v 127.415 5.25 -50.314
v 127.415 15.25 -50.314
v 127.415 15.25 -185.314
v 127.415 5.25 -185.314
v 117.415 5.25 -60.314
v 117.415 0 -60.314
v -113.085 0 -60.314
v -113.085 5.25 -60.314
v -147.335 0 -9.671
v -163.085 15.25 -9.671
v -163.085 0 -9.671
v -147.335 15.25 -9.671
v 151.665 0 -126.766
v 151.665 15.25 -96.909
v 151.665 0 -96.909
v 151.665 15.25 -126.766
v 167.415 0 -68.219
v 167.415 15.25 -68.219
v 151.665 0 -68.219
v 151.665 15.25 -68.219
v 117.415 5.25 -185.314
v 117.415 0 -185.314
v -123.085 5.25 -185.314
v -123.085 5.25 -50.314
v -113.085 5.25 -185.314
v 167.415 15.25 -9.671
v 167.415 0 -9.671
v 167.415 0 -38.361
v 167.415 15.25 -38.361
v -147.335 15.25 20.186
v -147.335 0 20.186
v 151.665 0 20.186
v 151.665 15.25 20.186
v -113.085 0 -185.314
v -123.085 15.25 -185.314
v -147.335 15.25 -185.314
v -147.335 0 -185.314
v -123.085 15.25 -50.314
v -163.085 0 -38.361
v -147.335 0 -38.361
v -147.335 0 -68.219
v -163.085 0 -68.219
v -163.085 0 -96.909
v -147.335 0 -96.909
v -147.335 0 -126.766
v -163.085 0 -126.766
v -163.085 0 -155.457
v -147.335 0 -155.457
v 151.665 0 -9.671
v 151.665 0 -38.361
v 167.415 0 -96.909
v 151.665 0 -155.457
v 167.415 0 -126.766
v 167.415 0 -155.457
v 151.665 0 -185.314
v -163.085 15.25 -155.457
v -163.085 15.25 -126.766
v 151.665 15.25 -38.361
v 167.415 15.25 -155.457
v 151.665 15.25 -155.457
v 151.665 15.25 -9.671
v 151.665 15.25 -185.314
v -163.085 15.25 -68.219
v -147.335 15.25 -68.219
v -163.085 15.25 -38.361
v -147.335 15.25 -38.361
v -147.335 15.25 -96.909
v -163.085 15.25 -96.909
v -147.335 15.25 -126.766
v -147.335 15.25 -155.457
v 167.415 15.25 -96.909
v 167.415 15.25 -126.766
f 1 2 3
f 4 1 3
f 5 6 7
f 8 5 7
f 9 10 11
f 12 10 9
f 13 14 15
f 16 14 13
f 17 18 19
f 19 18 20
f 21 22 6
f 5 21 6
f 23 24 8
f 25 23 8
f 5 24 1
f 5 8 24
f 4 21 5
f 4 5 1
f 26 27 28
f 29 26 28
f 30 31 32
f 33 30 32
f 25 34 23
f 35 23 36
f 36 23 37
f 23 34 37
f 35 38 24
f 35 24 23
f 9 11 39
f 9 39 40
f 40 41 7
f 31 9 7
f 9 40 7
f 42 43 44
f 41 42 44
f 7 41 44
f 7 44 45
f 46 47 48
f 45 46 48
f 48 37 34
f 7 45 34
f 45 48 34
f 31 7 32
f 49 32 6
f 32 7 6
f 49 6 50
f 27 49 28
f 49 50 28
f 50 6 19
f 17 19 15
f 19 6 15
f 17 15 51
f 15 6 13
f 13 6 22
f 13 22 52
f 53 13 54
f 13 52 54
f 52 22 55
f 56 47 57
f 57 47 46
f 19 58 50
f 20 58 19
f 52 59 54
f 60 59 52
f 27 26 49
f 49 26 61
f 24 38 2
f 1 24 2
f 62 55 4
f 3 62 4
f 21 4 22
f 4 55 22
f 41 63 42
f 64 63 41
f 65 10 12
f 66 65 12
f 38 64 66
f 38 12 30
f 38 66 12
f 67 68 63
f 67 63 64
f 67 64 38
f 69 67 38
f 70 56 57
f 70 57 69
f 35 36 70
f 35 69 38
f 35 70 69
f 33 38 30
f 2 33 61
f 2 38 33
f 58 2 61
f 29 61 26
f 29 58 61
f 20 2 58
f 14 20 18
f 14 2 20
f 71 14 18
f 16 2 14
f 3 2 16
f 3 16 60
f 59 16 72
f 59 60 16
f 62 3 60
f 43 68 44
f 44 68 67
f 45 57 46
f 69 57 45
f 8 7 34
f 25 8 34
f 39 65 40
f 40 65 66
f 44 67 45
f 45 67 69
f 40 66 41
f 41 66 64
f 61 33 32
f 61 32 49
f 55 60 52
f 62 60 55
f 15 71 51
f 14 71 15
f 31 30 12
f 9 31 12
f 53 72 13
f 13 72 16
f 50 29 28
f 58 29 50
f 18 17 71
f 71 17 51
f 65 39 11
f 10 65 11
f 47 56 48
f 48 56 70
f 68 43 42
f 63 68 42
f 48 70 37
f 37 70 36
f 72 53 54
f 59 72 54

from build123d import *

# Parameters (mm, degrees)
BOSS_EXTRU_1_DEPTH      = 15.25
ESQUISSE2_W             = 250.5
ESQUISSE2_H             = 135
ENL_V_MAT_EXTRU_1_DEPTH = 10
ESQUISSE3_W             = 15.75
ESQUISSE3_H             = 29.857142857
ESQUISSE3_H_2           = 29.857142858
ENL_V_MAT_EXTRU_2_DEPTH = 15.25


with BuildPart() as part:
    # Esquisse1 → Boss.-Extru.1 (new body)
    with BuildSketch(Plane(origin=(0, 0, 0), x_dir=(1, 0, 0), z_dir=(0, 1, 0))):
        Polygon((-113.085152838, 185.313864629), (-163.085152838, 185.313864629), (-163.085152838, -20.186135371), (167.414847162, -20.186135371), (167.414847162, 185.313864629), (117.414847162, 185.313864629), (117.414847162, 60.313864629), (-113.085152838, 60.313864629), align=None)
    extrude(amount=BOSS_EXTRU_1_DEPTH)

    # Esquisse2 → Enlèv. mat.-Extru.1 (cut)
    with BuildSketch(Plane(origin=(0, 15.25, 0), x_dir=(1, 0, 0), z_dir=(0, 1, 0))):
        with Locations((2.164847162, 117.813864629)):
            Rectangle(ESQUISSE2_W, ESQUISSE2_H)
    extrude(amount=-ENL_V_MAT_EXTRU_1_DEPTH, mode=Mode.SUBTRACT)

    # Esquisse3 → Enlèv. mat.-Extru.2 (cut)
    with BuildSketch(Plane(origin=(0, 15.25, 0), x_dir=(1, 0, 0), z_dir=(0, 1, 0))):
        with Locations((-155.210152838, 170.385293201)):
            Rectangle(ESQUISSE3_W, ESQUISSE3_H)
        with Locations((-155.210152838, 111.837674152)):
            Rectangle(ESQUISSE3_W, ESQUISSE3_H)
        with Locations((-155.210152838, 53.290055105)):
            Rectangle(ESQUISSE3_W, ESQUISSE3_H_2)
        with Locations((-155.210152838, -5.257563943)):
            Rectangle(ESQUISSE3_W, ESQUISSE3_H)
    enl_v_mat_extru_2 = extrude(amount=-ENL_V_MAT_EXTRU_2_DEPTH, mode=Mode.SUBTRACT)

    # Symétrie1: Enlèv. mat.-Extru.2 across plane
    add(enl_v_mat_extru_2.mirror(Plane.ZY.offset(-2.164847162)), mode=Mode.SUBTRACT)


solid = part.part
